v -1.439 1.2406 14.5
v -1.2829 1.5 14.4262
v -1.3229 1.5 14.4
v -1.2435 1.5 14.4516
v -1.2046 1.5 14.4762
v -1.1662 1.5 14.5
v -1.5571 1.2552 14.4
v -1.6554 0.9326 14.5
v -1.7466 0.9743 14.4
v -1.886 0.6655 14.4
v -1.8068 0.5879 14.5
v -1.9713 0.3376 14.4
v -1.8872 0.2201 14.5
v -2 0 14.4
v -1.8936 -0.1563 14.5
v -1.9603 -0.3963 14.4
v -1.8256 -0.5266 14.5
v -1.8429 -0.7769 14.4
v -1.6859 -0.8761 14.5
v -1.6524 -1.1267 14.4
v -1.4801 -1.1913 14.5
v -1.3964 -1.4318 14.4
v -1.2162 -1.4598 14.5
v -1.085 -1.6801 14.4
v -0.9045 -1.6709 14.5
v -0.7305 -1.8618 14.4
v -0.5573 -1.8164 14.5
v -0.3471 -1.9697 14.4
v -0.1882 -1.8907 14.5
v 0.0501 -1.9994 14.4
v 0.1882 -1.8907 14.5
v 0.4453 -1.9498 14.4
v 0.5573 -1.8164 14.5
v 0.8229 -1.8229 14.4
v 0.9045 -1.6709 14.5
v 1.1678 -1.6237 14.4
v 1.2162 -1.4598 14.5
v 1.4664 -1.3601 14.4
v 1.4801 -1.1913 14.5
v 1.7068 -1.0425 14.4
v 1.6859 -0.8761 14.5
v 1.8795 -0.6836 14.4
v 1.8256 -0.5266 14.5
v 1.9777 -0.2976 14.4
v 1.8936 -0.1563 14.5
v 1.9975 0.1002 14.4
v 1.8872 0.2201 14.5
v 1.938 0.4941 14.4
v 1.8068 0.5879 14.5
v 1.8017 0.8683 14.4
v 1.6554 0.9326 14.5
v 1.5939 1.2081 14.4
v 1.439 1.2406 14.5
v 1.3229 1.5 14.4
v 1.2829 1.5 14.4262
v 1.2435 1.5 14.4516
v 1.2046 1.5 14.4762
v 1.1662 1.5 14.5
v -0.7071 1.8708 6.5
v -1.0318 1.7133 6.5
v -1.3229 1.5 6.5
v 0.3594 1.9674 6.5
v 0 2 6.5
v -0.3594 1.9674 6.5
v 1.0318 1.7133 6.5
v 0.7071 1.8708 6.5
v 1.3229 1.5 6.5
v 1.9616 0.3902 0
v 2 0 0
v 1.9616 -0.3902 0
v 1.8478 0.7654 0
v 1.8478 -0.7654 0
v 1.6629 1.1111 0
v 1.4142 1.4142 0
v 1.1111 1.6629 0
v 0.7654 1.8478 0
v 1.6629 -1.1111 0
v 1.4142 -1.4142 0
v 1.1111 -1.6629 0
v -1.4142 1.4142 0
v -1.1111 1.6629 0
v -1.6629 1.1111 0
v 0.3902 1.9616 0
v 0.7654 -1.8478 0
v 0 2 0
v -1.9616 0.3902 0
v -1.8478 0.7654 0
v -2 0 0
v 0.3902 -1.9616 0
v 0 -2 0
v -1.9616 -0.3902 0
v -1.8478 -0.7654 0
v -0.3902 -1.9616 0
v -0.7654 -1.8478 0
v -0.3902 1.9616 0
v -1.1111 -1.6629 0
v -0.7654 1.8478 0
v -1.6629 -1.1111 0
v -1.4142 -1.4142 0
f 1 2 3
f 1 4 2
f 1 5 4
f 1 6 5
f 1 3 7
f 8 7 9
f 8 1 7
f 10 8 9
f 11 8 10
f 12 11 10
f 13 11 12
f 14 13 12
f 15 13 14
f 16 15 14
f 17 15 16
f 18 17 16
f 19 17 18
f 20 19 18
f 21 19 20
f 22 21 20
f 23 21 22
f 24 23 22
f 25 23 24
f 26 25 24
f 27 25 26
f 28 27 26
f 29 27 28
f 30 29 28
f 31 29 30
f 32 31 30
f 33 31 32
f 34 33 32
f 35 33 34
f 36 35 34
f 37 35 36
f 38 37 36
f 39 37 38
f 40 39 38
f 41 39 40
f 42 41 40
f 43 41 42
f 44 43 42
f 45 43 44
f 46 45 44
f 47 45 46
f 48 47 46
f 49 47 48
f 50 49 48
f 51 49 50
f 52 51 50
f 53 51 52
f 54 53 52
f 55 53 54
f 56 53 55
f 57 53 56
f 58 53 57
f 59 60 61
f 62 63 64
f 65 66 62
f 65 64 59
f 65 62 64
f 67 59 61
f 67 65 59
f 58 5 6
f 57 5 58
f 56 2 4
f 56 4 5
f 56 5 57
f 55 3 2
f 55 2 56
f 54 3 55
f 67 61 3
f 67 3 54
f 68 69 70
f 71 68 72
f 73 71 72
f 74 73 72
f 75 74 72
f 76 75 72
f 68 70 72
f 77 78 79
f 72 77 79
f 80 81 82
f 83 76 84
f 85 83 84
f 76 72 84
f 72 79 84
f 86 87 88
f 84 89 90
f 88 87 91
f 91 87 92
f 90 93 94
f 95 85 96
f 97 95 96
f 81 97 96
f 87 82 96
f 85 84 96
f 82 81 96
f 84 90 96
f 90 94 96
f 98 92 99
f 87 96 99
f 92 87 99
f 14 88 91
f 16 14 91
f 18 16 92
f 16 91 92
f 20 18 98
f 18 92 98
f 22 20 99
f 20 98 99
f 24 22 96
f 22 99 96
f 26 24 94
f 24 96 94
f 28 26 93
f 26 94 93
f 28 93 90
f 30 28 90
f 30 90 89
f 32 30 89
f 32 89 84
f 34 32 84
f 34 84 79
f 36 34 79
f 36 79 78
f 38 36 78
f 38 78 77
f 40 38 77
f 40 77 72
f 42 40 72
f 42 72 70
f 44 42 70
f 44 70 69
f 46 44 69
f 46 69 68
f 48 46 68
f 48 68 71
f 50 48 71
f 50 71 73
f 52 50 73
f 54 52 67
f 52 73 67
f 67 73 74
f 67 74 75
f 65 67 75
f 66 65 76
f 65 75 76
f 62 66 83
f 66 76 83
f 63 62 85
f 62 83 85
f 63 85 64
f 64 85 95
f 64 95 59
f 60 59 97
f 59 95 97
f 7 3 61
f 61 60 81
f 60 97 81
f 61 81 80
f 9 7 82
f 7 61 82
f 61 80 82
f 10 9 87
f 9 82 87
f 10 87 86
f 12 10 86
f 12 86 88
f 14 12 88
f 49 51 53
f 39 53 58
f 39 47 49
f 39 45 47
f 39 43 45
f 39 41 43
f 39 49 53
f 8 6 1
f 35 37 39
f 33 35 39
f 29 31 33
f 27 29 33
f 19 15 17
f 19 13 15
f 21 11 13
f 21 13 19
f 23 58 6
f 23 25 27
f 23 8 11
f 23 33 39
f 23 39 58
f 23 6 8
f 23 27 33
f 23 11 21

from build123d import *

# Parameters (mm, degrees)
SKETCH1_R           = 2
BOSS_EXTRUDE1_DEPTH = 14.5
CUT_EXTRUDE1_START  = -8
CUT_EXTRUDE1_DEPTH  = 8
CHAMFER1_SIZE       = 0.1


with BuildPart() as part:
    # Sketch1 → Boss-Extrude1 (new body)
    with BuildSketch(Plane.XY):
        with Locations(Location((0, 0, 0), (0, 0, 180))):
            Circle(SKETCH1_R)
    extrude(amount=BOSS_EXTRUDE1_DEPTH)

    # Sketch2 → Cut-Extrude1 (cut)
    with BuildSketch(Plane.XY.offset(14.5).offset(CUT_EXTRUDE1_START)):
        with BuildLine():
            Line((-1.322875656, 1.5), (1.322875656, 1.5))
            ThreePointArc((1.322875656, 1.5), (0, 2), (-1.322875656, 1.5))
        make_face()
    extrude(amount=CUT_EXTRUDE1_DEPTH, mode=Mode.SUBTRACT)

    # Chamfer1
    chamfer1_edges = [part.edges().sort_by_distance(p)[0] for p in [
        (0.822875656, -1.822875656, 14.5),
    ]]
    chamfer(chamfer1_edges, length=CHAMFER1_SIZE)


solid = part.part
